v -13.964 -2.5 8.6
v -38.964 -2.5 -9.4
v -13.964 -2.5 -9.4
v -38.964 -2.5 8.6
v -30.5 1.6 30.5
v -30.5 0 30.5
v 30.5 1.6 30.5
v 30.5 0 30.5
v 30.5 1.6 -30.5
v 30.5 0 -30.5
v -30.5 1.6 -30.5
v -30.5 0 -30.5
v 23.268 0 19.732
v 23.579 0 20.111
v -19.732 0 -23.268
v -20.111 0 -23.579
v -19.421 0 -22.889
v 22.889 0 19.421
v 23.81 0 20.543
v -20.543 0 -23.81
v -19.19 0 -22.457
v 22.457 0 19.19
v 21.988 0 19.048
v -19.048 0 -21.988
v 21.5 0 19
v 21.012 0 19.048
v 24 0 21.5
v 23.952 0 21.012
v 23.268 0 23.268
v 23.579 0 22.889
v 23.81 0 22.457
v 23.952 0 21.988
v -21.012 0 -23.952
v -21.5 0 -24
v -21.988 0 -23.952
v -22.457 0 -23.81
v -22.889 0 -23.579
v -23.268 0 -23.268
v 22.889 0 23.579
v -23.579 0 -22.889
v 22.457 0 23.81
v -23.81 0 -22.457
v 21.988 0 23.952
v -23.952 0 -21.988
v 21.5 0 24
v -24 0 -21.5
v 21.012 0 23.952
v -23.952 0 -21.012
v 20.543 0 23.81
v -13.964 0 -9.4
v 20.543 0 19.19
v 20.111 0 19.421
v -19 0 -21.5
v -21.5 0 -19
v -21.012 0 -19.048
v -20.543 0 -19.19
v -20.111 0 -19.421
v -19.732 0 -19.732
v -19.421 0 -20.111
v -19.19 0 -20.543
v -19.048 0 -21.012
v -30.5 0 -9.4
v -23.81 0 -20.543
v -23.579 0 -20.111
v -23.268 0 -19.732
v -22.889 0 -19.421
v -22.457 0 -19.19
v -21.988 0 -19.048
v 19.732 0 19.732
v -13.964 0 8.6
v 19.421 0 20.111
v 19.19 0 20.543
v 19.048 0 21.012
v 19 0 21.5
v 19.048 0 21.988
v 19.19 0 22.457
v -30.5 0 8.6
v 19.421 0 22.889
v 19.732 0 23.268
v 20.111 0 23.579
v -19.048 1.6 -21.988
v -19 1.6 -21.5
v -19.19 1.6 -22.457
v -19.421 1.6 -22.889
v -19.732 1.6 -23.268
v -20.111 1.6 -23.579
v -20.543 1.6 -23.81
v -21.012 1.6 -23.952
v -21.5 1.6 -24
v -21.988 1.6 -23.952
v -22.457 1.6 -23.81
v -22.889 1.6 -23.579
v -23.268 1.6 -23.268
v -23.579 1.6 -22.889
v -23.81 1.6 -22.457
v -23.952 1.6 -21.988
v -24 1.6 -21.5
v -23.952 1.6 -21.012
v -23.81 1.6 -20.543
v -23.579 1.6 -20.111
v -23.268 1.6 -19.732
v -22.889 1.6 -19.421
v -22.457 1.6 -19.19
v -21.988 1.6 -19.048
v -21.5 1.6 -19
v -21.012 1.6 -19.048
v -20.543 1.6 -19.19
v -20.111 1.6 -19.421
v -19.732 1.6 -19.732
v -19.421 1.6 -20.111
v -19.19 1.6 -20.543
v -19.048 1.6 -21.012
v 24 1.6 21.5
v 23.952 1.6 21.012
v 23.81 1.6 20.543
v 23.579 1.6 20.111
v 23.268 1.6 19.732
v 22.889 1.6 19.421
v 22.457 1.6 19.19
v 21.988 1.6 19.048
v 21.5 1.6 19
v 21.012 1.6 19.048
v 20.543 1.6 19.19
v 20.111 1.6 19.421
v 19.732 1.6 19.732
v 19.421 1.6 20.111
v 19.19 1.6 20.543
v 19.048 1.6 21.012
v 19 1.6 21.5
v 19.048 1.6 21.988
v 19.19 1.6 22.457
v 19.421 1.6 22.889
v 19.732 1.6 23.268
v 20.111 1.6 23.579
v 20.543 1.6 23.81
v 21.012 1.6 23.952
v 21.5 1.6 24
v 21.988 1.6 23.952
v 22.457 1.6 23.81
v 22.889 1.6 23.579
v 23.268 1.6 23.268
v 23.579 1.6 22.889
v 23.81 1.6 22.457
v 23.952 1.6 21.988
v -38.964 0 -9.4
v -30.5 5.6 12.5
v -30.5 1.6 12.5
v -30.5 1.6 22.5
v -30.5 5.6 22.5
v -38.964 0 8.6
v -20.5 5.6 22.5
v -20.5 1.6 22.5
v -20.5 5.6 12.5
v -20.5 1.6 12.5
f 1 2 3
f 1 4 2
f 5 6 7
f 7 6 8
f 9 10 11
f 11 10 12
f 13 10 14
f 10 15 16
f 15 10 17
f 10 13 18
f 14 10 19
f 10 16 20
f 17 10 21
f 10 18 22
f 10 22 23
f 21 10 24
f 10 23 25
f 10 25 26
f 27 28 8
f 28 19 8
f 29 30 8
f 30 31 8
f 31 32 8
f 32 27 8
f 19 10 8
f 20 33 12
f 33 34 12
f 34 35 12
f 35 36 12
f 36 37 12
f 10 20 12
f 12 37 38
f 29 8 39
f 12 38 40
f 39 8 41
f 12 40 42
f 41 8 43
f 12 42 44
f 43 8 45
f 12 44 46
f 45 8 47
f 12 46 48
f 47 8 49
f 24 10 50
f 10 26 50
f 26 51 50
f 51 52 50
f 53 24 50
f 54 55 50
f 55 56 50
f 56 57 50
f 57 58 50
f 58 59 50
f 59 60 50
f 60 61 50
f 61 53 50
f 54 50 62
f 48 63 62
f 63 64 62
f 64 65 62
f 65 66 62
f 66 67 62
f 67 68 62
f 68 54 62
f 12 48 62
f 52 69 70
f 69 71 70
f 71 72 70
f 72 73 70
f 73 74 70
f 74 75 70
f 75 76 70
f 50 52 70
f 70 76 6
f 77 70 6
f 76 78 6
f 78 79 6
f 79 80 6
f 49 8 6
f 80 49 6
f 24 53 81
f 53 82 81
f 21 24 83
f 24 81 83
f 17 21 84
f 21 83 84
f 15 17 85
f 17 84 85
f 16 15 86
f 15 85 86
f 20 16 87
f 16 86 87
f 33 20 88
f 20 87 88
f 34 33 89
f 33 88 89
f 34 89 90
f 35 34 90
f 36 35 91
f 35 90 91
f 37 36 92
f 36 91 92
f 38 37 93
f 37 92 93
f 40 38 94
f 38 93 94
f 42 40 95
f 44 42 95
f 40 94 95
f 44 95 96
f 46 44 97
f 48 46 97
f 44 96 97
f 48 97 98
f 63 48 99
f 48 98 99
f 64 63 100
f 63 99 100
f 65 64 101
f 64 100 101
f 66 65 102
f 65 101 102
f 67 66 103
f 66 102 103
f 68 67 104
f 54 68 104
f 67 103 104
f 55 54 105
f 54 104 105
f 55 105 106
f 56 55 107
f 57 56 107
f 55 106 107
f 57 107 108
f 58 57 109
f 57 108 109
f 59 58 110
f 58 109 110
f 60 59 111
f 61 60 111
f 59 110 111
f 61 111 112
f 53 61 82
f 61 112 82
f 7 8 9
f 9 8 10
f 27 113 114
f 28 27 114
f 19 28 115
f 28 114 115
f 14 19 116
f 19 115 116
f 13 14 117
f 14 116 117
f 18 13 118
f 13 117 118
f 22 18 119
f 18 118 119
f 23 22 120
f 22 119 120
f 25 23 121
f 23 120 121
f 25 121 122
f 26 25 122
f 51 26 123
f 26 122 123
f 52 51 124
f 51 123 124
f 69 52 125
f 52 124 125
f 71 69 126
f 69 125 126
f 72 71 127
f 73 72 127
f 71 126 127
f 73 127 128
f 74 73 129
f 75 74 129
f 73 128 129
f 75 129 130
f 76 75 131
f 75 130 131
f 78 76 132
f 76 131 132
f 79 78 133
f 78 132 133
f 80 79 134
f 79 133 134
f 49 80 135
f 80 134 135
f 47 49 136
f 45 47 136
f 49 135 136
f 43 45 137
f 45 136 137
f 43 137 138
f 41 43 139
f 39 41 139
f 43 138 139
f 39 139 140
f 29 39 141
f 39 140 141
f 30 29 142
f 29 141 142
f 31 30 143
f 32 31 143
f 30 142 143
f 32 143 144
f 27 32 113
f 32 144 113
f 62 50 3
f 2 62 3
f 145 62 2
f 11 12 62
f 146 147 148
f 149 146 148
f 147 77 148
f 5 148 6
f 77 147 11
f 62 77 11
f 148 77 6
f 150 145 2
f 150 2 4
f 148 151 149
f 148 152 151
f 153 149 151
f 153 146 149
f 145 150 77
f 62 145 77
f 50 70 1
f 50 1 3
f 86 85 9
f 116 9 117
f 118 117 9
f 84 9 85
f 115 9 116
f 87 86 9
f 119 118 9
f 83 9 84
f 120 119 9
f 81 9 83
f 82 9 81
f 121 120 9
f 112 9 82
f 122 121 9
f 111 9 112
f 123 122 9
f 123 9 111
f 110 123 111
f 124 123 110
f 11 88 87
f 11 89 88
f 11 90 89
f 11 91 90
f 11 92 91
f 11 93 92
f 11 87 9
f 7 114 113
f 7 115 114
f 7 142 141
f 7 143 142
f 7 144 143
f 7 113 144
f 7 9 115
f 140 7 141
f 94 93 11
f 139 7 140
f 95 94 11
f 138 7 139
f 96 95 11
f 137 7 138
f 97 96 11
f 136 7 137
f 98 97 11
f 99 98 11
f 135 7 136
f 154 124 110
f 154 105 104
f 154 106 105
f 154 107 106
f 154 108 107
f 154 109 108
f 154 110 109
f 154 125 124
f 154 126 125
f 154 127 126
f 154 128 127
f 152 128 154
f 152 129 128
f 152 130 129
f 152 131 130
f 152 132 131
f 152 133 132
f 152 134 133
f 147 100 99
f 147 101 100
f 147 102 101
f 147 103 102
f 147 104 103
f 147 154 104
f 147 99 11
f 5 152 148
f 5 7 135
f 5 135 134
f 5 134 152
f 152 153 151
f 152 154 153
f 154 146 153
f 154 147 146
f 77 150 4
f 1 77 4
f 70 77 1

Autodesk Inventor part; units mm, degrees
ref_plane "YZ Plane" through (0, 0, 0) normal (1, 0, 0) x (0, 1, 0)
ref_plane "XZ Plane" through (0, 0, 0) normal (0, 1, 0) x (-1, 0, 0)
ref_plane "XY Plane" through (0, 0, 0) normal (0, 0, 1) x (1, 0, 0)
sketch "Szkic1" plane through (0, 0, 0) normal (0, 1, 0) x (-1, 0, 0)
  line L0 (30.5, 30.5) -> (-30.5, 30.5)
  line L1 (-30.5, 30.5) -> (-30.5, -30.5)
  line L2 (-30.5, -30.5) -> (30.5, -30.5)
  line L3 (30.5, -30.5) -> (30.5, 30.5)
  point P0 (0, 0)
  point P1 (30.5, 0)
  point P2 (0, -30.5)
  dimension "d0" = 61
  dimension "d1" = 61
extrude "Wyciągnięcie proste1" add sketch "Szkic1" along normal blind 1.6
sketch "Szkic2" plane through (0, 1.6, 0) normal (0, 1, 0) x (1, 0, 0)
  circle A0 centre (21.5, -21.5) radius 2.5
  circle A1 centre (-21.5, 21.5) radius 2.5
  line L0 (-30.5, -30.5) -> (30.5, -30.5) projected
  line L1 (-30.5, 30.5) -> (-30.5, -30.5) projected
  line L2 (30.5, 30.5) -> (-30.5, 30.5) projected
  line L3 (30.5, -30.5) -> (30.5, 30.5) projected
  point P0 (0, 0)
  dimension "d4" = 5
  dimension "d5" = 5
  dimension "d6" = 9
  dimension "d8" = 9
  dimension "d12" = 9
  dimension "d13" = 9
extrude "Wyciągnięcie proste2" cut sketch "Szkic2" against normal up to surface (1.6 mm away) contours A0 | A1
sketch "Szkic3" plane through (0, 0, 0) normal (0, -1, 0) x (1, 0, 0)
  line L0 (-13.9641, -9.4) -> (-38.9641, -9.4)
  line L1 (-38.9641, -9.4) -> (-38.9641, 8.6)
  line L2 (-38.9641, 8.6) -> (-13.9641, 8.6)
  line L3 (-13.9641, 8.6) -> (-13.9641, -9.4)
  line L4 (-30.5, 30.5) -> (30.5, 30.5) projected
  line L5 (-30.5, -30.5) -> (-30.5, 30.5) projected
  point P0 (0, 0)
  dimension "d14" = 18
  dimension "d15" = 25
  dimension "d16" = 21.9
  dimension "d17" = 8.4641
extrude "Wyciągnięcie proste3" add sketch "Szkic3" along normal blind 2.5
sketch "Szkic4" plane through (0, 1.6, 0) normal (0, 1, 0) x (1, 0, 0)
  line L0 (-30.5, -12.5) -> (-20.5, -12.5)
  line L1 (-20.5, -12.5) -> (-20.5, -22.5)
  line L2 (-20.5, -22.5) -> (-30.5, -22.5)
  line L3 (-30.5, -22.5) -> (-30.5, -12.5)
  line L4 (-30.5, -30.5) -> (30.5, -30.5) projected
  line L5 (-30.5, 30.5) -> (-30.5, -30.5) projected
  point P0 (0, 0)
  dimension "d20" = 10
  dimension "d21" = 10
  dimension "d22" = 8
extrude "Wyciągnięcie proste4" add sketch "Szkic4" along normal blind 4
properties part number "PCB"
